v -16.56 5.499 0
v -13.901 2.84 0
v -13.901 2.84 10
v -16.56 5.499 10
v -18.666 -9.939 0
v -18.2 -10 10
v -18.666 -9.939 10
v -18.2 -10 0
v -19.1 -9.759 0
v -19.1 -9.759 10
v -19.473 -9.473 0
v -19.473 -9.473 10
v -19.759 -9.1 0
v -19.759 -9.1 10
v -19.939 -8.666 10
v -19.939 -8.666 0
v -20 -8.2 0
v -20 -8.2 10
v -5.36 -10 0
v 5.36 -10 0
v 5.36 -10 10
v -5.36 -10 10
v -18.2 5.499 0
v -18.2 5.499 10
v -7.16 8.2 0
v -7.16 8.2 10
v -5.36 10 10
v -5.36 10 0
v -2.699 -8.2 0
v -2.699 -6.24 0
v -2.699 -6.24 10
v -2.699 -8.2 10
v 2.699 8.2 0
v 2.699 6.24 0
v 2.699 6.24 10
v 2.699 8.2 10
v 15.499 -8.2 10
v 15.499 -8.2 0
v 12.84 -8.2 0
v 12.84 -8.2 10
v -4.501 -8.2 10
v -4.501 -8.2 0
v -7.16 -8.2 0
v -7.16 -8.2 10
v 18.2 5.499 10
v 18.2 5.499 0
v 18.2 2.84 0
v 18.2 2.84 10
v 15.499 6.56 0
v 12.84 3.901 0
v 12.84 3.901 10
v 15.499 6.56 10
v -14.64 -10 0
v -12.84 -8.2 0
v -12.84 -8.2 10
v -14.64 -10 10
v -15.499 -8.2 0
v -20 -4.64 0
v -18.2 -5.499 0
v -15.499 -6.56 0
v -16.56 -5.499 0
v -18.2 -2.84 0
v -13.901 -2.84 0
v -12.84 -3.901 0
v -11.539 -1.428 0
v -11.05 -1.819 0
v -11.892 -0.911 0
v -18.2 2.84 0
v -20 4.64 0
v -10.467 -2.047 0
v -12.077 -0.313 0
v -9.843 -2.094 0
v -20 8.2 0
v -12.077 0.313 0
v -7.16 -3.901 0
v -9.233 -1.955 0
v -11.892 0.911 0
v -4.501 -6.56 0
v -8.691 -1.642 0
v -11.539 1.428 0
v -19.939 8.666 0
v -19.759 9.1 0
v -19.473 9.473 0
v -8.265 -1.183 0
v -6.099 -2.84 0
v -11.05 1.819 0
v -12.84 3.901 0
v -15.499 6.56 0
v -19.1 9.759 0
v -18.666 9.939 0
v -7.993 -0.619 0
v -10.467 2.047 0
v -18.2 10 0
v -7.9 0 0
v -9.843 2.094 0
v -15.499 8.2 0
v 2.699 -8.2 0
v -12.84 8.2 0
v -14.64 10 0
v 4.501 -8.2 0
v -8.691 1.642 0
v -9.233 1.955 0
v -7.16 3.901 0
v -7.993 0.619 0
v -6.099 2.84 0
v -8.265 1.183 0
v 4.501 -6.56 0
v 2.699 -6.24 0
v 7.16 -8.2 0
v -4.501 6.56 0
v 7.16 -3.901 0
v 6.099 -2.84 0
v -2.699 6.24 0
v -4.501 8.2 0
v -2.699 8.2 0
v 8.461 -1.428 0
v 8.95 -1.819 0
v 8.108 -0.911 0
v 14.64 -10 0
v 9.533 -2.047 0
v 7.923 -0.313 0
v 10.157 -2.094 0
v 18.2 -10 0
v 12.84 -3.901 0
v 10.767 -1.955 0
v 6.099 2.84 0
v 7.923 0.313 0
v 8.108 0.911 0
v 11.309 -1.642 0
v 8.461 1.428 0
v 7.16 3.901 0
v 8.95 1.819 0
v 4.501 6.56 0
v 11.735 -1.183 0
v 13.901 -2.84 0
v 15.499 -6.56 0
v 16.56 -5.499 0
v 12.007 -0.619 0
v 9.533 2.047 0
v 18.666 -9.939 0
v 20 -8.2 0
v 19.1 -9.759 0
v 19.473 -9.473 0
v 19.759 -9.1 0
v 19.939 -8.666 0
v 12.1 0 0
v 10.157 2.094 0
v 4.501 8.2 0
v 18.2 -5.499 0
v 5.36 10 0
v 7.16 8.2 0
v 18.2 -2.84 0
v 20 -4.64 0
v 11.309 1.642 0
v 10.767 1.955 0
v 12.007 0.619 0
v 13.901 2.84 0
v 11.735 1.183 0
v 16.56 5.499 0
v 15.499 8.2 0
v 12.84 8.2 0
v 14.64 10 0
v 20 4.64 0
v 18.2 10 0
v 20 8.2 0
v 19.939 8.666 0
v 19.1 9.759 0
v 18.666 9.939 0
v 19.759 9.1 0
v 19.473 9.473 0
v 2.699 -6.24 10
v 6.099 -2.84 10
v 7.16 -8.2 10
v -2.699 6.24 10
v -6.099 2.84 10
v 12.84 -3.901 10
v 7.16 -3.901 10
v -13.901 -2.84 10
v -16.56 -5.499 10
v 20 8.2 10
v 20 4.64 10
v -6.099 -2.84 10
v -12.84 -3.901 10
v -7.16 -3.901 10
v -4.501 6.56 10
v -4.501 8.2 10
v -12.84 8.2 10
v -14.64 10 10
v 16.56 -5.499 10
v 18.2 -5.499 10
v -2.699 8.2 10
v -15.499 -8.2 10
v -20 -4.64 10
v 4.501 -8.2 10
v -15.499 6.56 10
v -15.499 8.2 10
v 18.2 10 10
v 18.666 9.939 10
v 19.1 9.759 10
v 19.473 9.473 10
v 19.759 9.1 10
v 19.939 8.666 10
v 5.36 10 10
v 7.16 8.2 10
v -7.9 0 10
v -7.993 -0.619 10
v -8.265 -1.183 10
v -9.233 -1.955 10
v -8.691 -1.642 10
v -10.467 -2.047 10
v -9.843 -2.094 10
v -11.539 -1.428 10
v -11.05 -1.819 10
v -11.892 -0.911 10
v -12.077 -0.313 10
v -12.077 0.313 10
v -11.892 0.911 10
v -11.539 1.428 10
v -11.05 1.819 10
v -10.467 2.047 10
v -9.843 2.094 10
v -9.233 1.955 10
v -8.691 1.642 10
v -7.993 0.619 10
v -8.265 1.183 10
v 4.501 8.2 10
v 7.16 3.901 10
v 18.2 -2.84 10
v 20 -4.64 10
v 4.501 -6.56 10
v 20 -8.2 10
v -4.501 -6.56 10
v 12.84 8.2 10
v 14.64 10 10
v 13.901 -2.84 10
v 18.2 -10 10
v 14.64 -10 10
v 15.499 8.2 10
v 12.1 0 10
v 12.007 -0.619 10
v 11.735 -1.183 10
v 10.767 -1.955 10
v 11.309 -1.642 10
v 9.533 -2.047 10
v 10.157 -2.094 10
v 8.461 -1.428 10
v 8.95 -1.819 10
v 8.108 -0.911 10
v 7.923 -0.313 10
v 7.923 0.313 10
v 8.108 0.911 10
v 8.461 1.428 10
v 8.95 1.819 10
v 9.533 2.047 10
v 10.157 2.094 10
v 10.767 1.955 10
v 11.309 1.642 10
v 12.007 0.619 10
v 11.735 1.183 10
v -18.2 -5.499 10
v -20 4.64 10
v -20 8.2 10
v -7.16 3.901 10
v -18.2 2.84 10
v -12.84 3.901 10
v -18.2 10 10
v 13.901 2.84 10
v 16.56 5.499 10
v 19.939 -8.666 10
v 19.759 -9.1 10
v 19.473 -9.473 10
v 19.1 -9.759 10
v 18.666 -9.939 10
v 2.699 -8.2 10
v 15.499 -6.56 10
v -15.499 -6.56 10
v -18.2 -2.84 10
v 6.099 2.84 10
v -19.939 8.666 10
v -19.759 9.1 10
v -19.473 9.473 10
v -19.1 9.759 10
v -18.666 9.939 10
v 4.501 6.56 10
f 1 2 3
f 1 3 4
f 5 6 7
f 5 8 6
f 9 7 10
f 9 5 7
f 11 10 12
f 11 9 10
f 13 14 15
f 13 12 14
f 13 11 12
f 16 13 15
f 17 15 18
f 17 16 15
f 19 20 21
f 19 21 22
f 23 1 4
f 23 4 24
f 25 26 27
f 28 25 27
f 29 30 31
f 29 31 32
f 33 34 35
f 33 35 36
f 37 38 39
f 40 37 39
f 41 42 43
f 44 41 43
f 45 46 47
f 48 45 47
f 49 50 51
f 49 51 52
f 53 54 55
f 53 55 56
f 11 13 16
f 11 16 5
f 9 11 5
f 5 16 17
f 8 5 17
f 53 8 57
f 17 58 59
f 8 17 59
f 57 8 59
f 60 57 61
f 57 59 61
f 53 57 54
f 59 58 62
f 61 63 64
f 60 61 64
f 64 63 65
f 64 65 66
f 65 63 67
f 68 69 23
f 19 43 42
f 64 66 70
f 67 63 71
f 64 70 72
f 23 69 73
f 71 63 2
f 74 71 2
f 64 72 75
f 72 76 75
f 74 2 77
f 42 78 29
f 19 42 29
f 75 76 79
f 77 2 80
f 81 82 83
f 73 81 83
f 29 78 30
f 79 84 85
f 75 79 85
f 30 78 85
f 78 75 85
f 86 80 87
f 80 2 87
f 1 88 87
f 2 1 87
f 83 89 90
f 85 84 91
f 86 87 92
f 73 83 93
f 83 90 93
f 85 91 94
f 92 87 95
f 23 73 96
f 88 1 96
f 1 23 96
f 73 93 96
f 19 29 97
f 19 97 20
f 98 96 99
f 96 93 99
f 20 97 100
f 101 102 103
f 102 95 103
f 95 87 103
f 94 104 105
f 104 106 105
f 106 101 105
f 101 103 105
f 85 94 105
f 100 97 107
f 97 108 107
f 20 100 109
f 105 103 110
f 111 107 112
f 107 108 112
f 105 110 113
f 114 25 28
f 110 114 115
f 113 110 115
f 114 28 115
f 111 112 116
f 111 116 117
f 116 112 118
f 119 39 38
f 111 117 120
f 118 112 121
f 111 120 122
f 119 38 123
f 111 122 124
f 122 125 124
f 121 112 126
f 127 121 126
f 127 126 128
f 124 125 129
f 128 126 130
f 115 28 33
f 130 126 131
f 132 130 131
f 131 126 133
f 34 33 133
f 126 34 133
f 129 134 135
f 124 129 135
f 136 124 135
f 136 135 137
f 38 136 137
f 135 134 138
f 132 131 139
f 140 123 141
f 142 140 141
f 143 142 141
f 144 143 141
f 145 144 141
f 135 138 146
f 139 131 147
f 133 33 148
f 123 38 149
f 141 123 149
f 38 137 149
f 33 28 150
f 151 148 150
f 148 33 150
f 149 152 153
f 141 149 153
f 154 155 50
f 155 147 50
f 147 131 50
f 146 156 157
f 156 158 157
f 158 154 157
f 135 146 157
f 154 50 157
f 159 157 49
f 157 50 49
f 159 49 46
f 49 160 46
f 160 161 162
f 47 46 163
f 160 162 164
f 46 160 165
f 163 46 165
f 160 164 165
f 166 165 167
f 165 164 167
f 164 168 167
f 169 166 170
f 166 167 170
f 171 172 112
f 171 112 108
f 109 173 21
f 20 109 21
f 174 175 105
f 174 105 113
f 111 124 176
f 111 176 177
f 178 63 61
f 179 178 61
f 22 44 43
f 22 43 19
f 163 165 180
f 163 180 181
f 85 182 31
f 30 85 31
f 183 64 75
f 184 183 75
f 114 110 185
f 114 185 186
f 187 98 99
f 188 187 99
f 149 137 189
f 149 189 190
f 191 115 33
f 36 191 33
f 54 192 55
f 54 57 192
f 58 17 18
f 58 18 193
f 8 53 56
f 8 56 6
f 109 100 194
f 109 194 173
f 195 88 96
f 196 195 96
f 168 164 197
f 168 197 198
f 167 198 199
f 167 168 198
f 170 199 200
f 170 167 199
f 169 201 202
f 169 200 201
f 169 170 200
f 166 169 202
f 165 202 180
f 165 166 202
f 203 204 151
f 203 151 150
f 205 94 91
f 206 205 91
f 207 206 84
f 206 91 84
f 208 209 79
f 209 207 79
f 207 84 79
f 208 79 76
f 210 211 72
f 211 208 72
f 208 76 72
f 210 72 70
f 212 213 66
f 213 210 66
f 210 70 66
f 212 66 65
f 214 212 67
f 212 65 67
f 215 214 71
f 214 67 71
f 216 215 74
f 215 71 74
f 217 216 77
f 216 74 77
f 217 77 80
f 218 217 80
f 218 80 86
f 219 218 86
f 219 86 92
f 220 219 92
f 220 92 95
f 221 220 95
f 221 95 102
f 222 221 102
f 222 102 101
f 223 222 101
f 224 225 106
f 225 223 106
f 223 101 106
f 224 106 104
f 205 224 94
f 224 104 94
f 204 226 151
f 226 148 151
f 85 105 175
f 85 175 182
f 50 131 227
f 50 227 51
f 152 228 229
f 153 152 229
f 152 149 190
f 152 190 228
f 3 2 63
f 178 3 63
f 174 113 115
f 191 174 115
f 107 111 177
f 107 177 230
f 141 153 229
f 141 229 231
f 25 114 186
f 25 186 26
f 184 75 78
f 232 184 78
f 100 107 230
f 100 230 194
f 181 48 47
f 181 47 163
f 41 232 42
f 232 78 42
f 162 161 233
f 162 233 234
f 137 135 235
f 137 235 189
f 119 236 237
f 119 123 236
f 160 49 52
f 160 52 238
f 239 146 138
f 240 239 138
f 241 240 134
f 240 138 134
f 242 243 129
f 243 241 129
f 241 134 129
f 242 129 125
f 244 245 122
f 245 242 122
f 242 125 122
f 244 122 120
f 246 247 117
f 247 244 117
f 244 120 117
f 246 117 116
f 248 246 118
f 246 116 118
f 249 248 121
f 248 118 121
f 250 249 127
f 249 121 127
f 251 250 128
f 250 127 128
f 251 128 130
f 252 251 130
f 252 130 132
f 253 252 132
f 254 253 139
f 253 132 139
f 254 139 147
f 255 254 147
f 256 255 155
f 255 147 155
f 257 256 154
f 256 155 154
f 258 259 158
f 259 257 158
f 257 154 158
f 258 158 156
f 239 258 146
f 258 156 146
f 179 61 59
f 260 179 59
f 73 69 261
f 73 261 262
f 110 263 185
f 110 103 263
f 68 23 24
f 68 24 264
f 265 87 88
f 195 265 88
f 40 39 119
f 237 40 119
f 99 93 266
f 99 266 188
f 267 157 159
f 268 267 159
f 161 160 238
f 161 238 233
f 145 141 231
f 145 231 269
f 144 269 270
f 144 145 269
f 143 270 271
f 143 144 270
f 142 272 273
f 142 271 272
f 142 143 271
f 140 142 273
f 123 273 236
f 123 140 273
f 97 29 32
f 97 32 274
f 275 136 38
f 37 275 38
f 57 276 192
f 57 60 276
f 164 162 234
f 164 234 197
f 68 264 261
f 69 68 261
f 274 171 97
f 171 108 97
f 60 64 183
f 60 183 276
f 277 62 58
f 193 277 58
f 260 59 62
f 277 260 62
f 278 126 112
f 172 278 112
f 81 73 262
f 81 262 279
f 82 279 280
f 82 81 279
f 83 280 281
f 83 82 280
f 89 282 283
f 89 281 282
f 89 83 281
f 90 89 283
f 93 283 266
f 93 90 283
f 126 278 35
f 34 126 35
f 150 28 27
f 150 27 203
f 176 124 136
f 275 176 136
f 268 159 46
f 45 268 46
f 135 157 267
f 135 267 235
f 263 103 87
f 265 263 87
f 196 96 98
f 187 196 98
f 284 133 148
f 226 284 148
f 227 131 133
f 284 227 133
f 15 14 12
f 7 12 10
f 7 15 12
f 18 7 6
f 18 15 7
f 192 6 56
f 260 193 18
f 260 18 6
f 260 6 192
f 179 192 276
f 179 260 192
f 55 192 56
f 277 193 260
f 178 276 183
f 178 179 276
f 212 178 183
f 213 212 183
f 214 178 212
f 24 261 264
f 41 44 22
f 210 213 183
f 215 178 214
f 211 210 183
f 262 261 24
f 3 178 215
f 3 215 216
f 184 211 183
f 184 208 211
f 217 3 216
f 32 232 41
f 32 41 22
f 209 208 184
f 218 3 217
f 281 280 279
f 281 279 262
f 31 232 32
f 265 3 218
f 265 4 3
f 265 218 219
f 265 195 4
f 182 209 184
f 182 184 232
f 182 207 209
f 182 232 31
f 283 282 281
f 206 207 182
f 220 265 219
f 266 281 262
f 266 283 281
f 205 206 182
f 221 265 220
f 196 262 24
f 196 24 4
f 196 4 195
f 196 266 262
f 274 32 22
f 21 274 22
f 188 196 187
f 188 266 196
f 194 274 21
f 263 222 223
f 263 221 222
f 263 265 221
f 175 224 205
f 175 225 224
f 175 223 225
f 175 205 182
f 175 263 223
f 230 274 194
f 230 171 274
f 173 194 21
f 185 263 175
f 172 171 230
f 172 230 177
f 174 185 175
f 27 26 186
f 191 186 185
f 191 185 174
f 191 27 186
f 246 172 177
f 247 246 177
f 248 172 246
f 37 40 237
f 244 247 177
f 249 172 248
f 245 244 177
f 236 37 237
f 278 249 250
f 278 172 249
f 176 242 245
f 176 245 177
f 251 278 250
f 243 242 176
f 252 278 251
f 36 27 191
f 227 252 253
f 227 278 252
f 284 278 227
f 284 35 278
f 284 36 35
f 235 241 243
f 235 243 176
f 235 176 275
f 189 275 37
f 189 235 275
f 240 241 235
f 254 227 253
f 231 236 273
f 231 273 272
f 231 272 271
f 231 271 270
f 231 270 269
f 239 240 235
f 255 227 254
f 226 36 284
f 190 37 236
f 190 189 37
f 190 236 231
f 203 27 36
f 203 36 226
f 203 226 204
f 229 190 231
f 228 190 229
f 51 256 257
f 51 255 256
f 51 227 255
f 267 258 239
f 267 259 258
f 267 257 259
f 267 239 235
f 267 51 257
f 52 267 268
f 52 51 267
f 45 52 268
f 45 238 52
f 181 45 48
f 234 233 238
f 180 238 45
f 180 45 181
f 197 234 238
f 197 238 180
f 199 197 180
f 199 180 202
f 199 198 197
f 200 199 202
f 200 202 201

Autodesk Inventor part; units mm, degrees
ref_plane "YZ Plane" through (0, 0, 0) normal (1, 0, 0) x (0, 1, 0)
ref_plane "Start Plane" through (0, 0, 0) normal (0, 0, 1) x (1, 0, 0)
ref_plane "End Plane" through (0, 0, 10) normal (0, 0, 1) x (1, 0, 0)
sketch "Sketch3" plane through (0, 0, 0) normal (0, 0, 1) x (1, 0, 0)
  line L0 (0, 0) -> (0, 10) construction
  line L1 (-10, 10) -> (-10, 0) construction
  line L2 (0, 0) -> (-10, 0) construction
  circle A0 centre (-10, 0) radius 2.1
  line L3 (-13.9007, 3.9007) -> (-6.0993, 3.9007) construction
  line L4 (-6.0993, 3.9007) -> (-6.0993, -3.9007) construction
  line L5 (-6.0993, -3.9007) -> (-13.9007, -3.9007) construction
  line L6 (-13.9007, -3.9007) -> (-13.9007, 3.9007) construction
  line L7 (-13.9007, 3.9007) -> (-6.0993, -3.9007) construction
  line L8 (-6.0993, 3.9007) -> (-13.9007, -3.9007) construction
  line L9 (-13.9007, -2.84) -> (-12.84, -3.9007) construction
  line L10 (-13.9007, -2.84) -> (-12.4007, -2.84) construction
  line L11 (-12.84, -3.9007) -> (-15.4993, -6.56)
  line L12 (-15.4993, -6.56) -> (-15.4993, -8.2)
  line L13 (-15.4993, -8.2) -> (-12.84, -8.2)
  line L14 (-12.84, -8.2) -> (-14.64, -10)
  line L15 (-7.16, -3.9007) -> (-4.5007, -6.56)
  line L16 (-4.5007, -6.56) -> (-4.5007, -8.2)
  line L17 (-4.5007, -8.2) -> (-7.16, -8.2)
  line L18 (-7.16, -8.2) -> (-5.36, -10)
  line L19 (-12.84, -3.9007) -> (-7.16, -3.9007)
  line L20 (-12.84, 3.9007) -> (-13.9007, 2.84) construction
  line L21 (-12.84, 3.9007) -> (-12.84, 2.4007) construction
  line L22 (-13.9007, 2.84) -> (-16.56, 5.4993)
  line L23 (-16.56, 5.4993) -> (-18.2, 5.4993)
  line L24 (-18.2, 5.4993) -> (-18.2, 2.84)
  line L25 (-18.2, 2.84) -> (-20, 4.64)
  line L26 (-18.2, -2.84) -> (-20, -4.64)
  line L27 (-18.2, -5.4993) -> (-18.2, -2.84)
  line L28 (-16.56, -5.4993) -> (-18.2, -5.4993)
  line L29 (-13.9007, -2.84) -> (-16.56, -5.4993)
  line L30 (-13.9007, 2.84) -> (-13.9007, -2.84)
  line L31 (-6.0993, 2.84) -> (-7.16, 3.9007) construction
  line L32 (-6.0993, 2.84) -> (-7.5993, 2.84) construction
  line L33 (-7.16, 3.9007) -> (-4.5007, 6.56)
  line L34 (-4.5007, 6.56) -> (-4.5007, 8.2)
  line L35 (-4.5007, 8.2) -> (-7.16, 8.2)
  line L36 (-7.16, 8.2) -> (-5.36, 10)
  line L37 (-12.84, 8.2) -> (-14.64, 10)
  line L38 (-15.4993, 8.2) -> (-12.84, 8.2)
  line L39 (-15.4993, 6.56) -> (-15.4993, 8.2)
  line L40 (-12.84, 3.9007) -> (-15.4993, 6.56)
  line L41 (-7.16, 3.9007) -> (-12.84, 3.9007)
  line L42 (-6.0993, 2.84) -> (-2.6993, 6.24)
  line L43 (-2.6993, 6.24) -> (-2.6993, 8.2)
  line L44 (-4.5007, 8.2) -> (0, 8.2) construction
  line L45 (-6.0993, -2.84) -> (-2.6993, -6.24)
  line L46 (-2.6993, -6.24) -> (-2.6993, -8.2)
  line L47 (10, 10) -> (10, 0) construction
  circle A1 centre (10, 0) radius 2.1
  line L48 (13.9007, 3.9007) -> (6.0993, -3.9007) construction
  line L49 (13.9007, -2.84) -> (12.84, -3.9007) construction
  line L50 (12.84, -3.9007) -> (15.4993, -6.56)
  line L51 (15.4993, -6.56) -> (15.4993, -8.2)
  line L52 (15.4993, -8.2) -> (12.84, -8.2)
  line L53 (12.84, -8.2) -> (14.64, -10)
  line L54 (7.16, -8.2) -> (5.36, -10)
  line L55 (4.5007, -8.2) -> (7.16, -8.2)
  line L56 (4.5007, -6.56) -> (4.5007, -8.2)
  line L57 (7.16, -3.9007) -> (4.5007, -6.56)
  line L58 (12.84, -3.9007) -> (7.16, -3.9007)
  line L59 (13.9007, 2.84) -> (13.9007, -2.84)
  line L60 (13.9007, 2.84) -> (16.56, 5.4993)
  line L61 (16.56, 5.4993) -> (18.2, 5.4993)
  line L62 (18.2, 5.4993) -> (18.2, 2.84)
  line L63 (18.2, 2.84) -> (20, 4.64)
  line L64 (18.2, -5.4993) -> (18.2, -2.84)
  line L65 (18.2, -2.84) -> (20, -4.64)
  line L66 (16.56, -5.4993) -> (18.2, -5.4993)
  line L67 (13.9007, -2.84) -> (16.56, -5.4993)
  line L68 (7.16, 3.9007) -> (12.84, 3.9007)
  line L69 (7.16, 3.9007) -> (4.5007, 6.56)
  line L70 (4.5007, 6.56) -> (4.5007, 8.2)
  line L71 (4.5007, 8.2) -> (7.16, 8.2)
  line L72 (7.16, 8.2) -> (5.36, 10)
  line L73 (15.4993, 8.2) -> (12.84, 8.2)
  line L74 (12.84, 8.2) -> (14.64, 10)
  line L75 (15.4993, 6.56) -> (15.4993, 8.2)
  line L76 (12.84, 3.9007) -> (15.4993, 6.56)
  line L77 (6.0993, 2.84) -> (2.6993, 6.24)
  line L78 (2.6993, 6.24) -> (2.6993, 8.2)
  line L79 (6.0993, -2.84) -> (2.6993, -6.24)
  line L80 (2.6993, -6.24) -> (2.6993, -8.2)
  line L81 (-14.64, -10) -> (-18.2, -10)
  line L82 (-20, -8.2) -> (-20, -4.64)
  line L83 (-20, 4.64) -> (-20, 8.2)
  line L84 (-18.2, 10) -> (-14.64, 10)
  line L85 (18.2, -10) -> (14.64, -10)
  line L86 (5.36, -10) -> (-5.36, -10)
  line L87 (-5.36, 10) -> (5.36, 10)
  line L88 (14.64, 10) -> (18.2, 10)
  line L89 (20, 8.2) -> (20, 4.64)
  line L90 (20, -4.64) -> (20, -8.2)
  line L91 (-2.6993, -8.2) -> (2.6993, -8.2)
  line L92 (-2.6993, 8.2) -> (2.6993, 8.2)
  line L93 (-6.0993, 2.84) -> (-6.0993, -2.84)
  line L94 (6.0993, 2.84) -> (6.0993, -2.84)
  arc A2 (-20, -8.2) -> (-18.2, -10) centre (-18.2, -8.2) ccw
  arc A3 (-18.2, 10) -> (-20, 8.2) centre (-18.2, 8.2) ccw
  arc A4 (18.2, -10) -> (20, -8.2) centre (18.2, -8.2) ccw
  arc A5 (20, 8.2) -> (18.2, 10) centre (18.2, 8.2) ccw
  point P0 (-13.9007, -3.9007)
  point P1 (-13.9007, 3.9007)
  point P2 (-13.9007, 3.9007)
  point P3 (-6.0993, 3.9007)
  point P4 (6.0993, 3.9007)
  point P5 (13.9007, -3.9007)
  point P6 (12.4007, -2.84)
  point P7 (13.9007, -3.9007)
  point P8 (13.9007, 3.9007)
  point P9 (12.84, 3.9007)
  point P10 (12.84, 2.4007)
  point P11 (13.9007, 3.9007)
  point P12 (6.0993, 3.9007)
  point P13 (7.5993, 2.84)
  point P14 (-20, 10)
  point P15 (20, -10)
  point P16 (20, 10)
  point P17 (-20, -10)
  dimension "d26" = 10
  dimension "d27" = 10
  dimension "d28" = 4.2
  dimension "d29" = 1.5
  dimension "d30" = 45
  dimension "d32" = 45
  dimension "d33" = 1.64
  dimension "d34" = 1.8
  dimension "d35" = 10
  dimension "d36" = 5.68
  dimension "d39" = 180
  dimension "d41" = 1.96
  dimension "d42" = 5.68
  dimension "d45" = 1.8
extrude "Body" add sketch "Sketch3" along normal up to surface (10 mm away) from surface at 0
sketch "Sketch4" plane through (0, 0, 0) normal (0, 0, 1) x (1, 0, 0)
  line L0 (0, 0) -> (10, 0)
ref_plane "Work Plane3" through (0, 0, 0) normal (0, -1, 0) x (1, 0, 0)
sketch "Sketch5" plane through (0, 0, 0) normal (0, -1, 0) x (1, 0, 0)
  line L0 (-28, 0) -> (28, 0)
  line L1 (-28, 10) -> (28, 10)
  dimension "d51" = 10
equation "\"d42\" = d36"
equation "\"G_OFFSET_START\" = 0"
equation "\"G_OFFSET_END\" = 0"
equation "\"G_L\" = d51"
properties part number "vslot 20 x 40" material "Aluminum 6061"
